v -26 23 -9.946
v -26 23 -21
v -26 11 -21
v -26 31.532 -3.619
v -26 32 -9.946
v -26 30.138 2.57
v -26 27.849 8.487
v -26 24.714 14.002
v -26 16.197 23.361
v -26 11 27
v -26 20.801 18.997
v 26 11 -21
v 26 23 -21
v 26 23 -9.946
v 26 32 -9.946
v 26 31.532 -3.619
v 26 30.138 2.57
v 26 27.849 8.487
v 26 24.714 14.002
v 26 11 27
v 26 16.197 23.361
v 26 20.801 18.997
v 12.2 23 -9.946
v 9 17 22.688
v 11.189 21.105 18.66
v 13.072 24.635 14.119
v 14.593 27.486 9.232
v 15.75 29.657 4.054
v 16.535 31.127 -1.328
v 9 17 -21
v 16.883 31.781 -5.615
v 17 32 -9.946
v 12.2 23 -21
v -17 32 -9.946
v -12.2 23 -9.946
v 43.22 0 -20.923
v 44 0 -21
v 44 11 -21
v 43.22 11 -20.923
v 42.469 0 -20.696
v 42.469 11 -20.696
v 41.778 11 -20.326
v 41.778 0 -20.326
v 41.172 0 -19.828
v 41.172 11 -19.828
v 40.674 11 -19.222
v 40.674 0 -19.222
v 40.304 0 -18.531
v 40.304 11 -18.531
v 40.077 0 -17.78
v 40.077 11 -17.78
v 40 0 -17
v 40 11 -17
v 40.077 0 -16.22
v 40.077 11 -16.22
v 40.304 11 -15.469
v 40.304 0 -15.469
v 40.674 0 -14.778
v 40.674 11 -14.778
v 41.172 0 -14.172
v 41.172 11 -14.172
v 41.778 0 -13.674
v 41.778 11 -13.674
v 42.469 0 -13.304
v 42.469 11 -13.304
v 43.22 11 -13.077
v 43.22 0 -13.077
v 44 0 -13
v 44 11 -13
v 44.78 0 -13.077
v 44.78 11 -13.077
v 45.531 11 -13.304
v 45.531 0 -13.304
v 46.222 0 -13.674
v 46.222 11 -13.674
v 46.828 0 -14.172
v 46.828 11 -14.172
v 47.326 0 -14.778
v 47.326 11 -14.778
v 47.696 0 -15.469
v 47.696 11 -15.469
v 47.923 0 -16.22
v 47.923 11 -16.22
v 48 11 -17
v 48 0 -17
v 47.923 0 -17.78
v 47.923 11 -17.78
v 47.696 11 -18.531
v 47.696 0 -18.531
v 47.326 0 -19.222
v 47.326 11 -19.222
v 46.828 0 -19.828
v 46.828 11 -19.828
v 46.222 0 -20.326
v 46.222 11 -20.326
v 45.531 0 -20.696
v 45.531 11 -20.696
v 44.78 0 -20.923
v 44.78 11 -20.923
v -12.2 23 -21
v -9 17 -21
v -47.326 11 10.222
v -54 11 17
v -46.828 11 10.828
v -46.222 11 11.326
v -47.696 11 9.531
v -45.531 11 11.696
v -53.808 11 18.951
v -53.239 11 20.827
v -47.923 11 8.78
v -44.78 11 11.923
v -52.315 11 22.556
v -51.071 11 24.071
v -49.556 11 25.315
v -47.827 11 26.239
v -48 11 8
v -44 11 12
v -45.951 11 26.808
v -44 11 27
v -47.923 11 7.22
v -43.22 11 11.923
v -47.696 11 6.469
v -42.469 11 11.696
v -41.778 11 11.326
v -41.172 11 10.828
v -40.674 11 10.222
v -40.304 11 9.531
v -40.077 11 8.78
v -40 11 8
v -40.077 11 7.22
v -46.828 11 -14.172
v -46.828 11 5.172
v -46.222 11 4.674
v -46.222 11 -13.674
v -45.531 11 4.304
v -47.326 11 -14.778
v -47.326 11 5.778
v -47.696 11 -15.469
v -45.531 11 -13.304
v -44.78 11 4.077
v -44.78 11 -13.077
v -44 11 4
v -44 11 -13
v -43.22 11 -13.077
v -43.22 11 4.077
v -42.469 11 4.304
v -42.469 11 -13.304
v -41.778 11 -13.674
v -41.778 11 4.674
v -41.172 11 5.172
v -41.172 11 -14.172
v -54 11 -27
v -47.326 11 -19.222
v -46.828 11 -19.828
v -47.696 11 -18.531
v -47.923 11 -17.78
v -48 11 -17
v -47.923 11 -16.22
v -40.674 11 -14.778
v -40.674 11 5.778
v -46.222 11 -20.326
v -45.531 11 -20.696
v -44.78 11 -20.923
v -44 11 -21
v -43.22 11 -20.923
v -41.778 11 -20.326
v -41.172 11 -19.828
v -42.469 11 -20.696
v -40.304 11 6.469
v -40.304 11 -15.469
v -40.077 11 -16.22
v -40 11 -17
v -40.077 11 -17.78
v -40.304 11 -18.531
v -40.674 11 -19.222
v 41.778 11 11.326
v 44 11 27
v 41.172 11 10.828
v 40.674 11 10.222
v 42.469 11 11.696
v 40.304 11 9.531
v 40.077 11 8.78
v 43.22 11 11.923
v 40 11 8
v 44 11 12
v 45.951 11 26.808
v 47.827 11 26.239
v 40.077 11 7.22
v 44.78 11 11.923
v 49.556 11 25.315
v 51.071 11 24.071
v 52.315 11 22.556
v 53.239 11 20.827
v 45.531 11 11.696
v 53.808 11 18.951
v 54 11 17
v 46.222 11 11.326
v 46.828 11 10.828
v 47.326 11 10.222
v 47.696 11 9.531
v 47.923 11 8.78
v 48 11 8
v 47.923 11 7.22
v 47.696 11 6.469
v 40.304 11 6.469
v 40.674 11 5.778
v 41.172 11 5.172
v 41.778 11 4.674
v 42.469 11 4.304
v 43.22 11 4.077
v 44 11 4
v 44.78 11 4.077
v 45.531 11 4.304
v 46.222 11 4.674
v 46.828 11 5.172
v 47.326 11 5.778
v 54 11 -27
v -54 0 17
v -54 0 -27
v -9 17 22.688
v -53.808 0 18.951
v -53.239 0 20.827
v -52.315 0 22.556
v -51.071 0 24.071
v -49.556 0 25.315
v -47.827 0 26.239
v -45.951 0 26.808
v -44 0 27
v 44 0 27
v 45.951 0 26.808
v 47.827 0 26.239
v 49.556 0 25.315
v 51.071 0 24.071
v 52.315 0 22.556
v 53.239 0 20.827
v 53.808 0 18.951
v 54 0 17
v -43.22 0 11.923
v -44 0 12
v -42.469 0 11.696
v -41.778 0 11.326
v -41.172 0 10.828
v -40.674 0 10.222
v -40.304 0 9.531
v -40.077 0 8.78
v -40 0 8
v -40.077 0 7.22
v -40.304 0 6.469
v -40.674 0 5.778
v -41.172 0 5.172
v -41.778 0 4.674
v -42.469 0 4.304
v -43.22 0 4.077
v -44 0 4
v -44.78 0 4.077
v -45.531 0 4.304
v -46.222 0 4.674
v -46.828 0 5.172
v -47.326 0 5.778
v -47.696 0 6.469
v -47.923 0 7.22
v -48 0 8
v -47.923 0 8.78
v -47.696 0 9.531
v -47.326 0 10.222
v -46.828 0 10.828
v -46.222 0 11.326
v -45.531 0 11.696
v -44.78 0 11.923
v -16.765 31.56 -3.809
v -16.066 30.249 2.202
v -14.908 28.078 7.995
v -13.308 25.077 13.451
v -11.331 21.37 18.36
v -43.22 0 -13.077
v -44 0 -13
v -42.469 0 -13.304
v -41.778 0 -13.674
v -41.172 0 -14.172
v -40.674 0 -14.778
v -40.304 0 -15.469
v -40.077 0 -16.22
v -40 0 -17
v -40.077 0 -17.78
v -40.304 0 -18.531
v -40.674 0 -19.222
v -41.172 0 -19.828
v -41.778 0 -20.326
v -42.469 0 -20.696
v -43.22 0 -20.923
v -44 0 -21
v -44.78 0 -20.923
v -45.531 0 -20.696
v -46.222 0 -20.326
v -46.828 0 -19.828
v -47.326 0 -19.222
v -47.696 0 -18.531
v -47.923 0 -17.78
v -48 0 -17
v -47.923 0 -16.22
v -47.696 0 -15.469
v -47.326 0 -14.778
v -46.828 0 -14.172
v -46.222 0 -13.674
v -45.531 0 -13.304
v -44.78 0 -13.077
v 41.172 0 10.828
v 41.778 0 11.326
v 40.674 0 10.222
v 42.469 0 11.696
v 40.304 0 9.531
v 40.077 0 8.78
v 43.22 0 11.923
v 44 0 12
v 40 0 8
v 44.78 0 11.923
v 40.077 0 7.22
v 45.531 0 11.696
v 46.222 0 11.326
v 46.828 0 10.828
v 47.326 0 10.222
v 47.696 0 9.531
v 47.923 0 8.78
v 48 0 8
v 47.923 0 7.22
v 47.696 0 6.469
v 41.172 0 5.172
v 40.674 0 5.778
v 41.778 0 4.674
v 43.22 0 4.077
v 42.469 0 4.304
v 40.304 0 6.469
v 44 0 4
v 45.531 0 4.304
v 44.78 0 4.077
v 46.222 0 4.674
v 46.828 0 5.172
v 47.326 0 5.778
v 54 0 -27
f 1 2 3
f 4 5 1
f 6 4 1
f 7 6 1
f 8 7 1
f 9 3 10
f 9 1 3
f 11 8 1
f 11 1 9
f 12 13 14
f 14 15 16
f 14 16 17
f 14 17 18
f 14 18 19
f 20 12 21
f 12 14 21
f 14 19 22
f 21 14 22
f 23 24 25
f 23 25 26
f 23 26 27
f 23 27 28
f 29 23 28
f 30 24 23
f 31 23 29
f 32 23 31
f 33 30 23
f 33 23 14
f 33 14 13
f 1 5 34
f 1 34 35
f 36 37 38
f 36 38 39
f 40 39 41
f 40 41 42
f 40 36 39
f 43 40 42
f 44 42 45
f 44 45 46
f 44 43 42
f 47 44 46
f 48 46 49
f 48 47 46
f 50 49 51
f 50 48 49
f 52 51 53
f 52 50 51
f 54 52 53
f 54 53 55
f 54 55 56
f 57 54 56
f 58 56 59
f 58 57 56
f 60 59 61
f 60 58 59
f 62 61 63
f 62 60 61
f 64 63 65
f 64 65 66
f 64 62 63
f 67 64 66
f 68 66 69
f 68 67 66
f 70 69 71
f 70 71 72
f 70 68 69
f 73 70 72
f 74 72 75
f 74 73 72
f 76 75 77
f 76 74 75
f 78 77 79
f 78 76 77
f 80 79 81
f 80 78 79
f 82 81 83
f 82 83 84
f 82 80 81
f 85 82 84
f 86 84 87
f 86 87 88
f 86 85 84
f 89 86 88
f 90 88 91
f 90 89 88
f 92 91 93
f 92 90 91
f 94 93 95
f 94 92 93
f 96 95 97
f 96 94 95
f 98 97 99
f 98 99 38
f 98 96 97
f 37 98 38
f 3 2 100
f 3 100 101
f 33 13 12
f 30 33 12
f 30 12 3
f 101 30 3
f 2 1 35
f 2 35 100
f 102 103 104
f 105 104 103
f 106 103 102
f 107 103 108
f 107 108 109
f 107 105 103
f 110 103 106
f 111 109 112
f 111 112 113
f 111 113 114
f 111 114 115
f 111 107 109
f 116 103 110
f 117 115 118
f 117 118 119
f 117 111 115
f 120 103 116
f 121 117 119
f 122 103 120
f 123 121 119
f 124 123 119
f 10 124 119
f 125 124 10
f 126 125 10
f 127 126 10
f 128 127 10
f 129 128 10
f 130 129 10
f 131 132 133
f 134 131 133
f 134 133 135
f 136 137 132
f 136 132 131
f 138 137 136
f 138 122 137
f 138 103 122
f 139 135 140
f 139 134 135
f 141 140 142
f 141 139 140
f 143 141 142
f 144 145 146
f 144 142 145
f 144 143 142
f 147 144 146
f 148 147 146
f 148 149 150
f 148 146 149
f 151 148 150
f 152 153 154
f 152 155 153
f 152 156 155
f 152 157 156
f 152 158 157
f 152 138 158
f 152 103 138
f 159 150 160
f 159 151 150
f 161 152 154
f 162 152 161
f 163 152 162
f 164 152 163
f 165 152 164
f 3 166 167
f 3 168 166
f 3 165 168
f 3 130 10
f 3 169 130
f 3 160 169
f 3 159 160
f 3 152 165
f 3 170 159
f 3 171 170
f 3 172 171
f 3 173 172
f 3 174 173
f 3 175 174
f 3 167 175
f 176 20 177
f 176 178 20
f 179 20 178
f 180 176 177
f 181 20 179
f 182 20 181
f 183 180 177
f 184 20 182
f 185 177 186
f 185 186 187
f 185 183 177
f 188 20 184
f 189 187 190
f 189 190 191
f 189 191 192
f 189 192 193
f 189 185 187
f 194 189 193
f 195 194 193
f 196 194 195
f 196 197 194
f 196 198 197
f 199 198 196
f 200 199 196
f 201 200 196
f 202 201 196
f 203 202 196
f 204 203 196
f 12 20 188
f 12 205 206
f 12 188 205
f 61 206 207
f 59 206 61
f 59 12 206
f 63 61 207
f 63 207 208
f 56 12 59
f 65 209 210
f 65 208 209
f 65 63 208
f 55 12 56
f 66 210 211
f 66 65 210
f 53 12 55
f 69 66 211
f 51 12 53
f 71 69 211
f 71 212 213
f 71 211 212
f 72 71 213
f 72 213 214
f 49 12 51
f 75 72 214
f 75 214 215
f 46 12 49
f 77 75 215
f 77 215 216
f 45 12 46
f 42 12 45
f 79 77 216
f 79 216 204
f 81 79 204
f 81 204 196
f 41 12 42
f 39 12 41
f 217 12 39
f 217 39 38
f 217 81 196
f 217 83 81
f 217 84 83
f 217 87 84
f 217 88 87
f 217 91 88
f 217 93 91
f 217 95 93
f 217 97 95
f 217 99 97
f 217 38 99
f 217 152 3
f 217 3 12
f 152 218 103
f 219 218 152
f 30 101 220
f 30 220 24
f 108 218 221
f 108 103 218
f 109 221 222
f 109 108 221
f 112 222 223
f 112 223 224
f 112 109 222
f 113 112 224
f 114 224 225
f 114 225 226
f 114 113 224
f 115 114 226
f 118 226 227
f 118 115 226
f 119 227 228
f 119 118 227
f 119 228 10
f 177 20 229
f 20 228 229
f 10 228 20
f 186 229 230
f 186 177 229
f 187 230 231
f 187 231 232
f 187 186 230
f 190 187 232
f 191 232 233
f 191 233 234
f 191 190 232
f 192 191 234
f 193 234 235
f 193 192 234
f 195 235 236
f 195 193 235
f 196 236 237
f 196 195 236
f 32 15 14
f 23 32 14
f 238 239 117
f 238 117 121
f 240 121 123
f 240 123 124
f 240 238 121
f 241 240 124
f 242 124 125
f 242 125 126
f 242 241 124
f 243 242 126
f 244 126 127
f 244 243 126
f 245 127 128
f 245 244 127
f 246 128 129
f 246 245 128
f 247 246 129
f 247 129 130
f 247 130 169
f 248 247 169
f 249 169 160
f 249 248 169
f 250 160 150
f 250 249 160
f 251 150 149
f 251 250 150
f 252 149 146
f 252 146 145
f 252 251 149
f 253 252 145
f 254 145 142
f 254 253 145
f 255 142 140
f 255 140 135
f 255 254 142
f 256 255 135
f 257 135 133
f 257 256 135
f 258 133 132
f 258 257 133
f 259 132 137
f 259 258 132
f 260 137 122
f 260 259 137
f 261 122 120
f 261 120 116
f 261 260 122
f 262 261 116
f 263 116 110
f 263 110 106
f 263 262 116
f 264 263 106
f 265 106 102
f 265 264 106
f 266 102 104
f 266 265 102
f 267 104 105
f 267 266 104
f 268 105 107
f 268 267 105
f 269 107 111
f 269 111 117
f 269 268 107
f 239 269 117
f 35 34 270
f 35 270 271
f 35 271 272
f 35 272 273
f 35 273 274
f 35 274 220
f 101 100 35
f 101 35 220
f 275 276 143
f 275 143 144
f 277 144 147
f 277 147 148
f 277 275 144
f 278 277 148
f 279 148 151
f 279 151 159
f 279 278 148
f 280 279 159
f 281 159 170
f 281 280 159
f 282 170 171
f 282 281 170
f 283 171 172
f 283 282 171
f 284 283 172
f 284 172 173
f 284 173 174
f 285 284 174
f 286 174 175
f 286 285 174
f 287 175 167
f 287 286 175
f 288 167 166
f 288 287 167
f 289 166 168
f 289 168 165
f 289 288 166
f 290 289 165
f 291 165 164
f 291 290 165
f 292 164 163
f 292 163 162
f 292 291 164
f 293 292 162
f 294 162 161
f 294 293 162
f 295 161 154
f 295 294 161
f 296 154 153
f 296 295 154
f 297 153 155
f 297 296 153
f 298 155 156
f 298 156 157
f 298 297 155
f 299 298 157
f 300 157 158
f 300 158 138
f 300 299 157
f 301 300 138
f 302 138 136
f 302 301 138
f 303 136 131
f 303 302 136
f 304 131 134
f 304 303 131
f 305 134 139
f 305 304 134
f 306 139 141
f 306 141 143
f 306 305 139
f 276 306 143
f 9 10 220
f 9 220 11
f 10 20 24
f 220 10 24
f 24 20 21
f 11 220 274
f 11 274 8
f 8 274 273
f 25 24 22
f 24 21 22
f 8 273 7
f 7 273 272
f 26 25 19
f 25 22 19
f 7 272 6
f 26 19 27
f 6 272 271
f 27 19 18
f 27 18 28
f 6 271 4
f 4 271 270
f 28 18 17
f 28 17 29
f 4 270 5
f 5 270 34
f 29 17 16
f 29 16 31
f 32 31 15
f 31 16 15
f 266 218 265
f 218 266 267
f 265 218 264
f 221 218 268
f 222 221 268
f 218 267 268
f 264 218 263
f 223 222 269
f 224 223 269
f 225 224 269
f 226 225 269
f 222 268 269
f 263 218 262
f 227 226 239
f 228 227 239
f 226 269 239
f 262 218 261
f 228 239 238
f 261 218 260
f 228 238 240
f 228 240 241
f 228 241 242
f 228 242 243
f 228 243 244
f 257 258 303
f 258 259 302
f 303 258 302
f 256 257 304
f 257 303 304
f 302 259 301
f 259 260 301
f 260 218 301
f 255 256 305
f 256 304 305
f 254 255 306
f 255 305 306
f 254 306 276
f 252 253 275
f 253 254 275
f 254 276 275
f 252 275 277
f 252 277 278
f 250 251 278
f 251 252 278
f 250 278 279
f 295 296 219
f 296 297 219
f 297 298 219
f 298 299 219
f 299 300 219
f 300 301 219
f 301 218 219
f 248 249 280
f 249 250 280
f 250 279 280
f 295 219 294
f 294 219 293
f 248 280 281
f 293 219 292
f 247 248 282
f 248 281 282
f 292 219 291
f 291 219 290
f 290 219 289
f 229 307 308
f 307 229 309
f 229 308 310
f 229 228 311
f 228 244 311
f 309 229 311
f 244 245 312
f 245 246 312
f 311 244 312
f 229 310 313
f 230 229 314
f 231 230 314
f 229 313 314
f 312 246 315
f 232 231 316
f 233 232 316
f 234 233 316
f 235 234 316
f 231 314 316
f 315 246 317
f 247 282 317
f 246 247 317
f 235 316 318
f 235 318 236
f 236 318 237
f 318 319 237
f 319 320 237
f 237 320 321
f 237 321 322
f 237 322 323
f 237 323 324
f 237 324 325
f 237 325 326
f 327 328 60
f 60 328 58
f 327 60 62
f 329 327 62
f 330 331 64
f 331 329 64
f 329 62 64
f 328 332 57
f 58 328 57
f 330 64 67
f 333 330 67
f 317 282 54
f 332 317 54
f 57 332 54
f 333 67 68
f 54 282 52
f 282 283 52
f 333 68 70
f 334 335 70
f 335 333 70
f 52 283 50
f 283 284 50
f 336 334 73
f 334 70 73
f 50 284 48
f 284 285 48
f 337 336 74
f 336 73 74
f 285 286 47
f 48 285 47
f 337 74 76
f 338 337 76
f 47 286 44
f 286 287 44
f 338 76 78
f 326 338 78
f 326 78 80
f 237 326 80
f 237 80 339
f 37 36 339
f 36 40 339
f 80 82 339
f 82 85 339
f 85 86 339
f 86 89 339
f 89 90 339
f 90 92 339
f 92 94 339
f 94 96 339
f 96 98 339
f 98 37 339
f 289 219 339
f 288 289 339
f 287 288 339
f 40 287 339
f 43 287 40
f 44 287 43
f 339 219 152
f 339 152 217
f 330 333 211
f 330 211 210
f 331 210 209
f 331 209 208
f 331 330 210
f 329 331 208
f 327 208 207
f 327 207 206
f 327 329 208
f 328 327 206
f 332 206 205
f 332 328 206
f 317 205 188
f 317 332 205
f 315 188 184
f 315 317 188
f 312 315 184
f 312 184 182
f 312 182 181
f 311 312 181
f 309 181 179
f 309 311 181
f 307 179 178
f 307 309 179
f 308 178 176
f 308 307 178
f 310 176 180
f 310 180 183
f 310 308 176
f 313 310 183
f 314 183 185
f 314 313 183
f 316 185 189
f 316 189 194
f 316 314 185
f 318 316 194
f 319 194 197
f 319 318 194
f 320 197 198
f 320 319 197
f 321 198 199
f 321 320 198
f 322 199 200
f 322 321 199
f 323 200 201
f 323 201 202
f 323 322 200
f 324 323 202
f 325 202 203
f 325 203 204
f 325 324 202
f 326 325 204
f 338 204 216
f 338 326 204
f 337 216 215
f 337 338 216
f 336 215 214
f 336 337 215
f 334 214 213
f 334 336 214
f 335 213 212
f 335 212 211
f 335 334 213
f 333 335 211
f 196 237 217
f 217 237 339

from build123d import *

# Parameters (mm, degrees)
SKETCH1_W                      = 108
SKETCH1_H                      = 54
SKETCH1_R                      = 4
BOSS_EXTRUDE3_DEPTH            = 11
BOSS_EXTRUDE4_DEPTH            = 26
CUT_EXTRUDE1_REACH             = 70.33
CUT_EXTRUDE1_DIRECTION_2_REACH = 70.33
FILLET1_R                      = 10


with BuildPart() as part:
    # Sketch1 → Boss-Extrude3 (new body)
    with BuildSketch(Plane(origin=(0, 0, 0), x_dir=(1, 0, 0), z_dir=(0, 1, 0))):
        Rectangle(SKETCH1_W, SKETCH1_H)
        with Locations((-44, -8)):
            Circle(SKETCH1_R, mode=Mode.SUBTRACT)
        with Locations((-44, 17)):
            Circle(SKETCH1_R, mode=Mode.SUBTRACT)
        with Locations((44, 17)):
            Circle(SKETCH1_R, mode=Mode.SUBTRACT)
        with Locations((44, -8)):
            Circle(SKETCH1_R, mode=Mode.SUBTRACT)
    extrude(amount=BOSS_EXTRUDE3_DEPTH)

    # Sketch4 → Boss-Extrude4 (add, symmetric)
    with BuildSketch(Plane(origin=(0, 0, 0), x_dir=(0, 0, -1), z_dir=(1, 0, 0))):
        with BuildLine():
            Line((9.945906404, 32), (9.945906404, 23))
            Line((9.945906404, 23), (21, 23))
            Line((21, 23), (21, 11))
            Line((21, 11), (-27, 11))
            ThreePointArc((-27, 11), (-11.302622957, 26.383151285), (9.945906404, 32))
        make_face()
    extrude(amount=BOSS_EXTRUDE4_DEPTH, both=True)

    # Sketch5 → Cut-Extrude1 (cut, up to next)
    with BuildSketch(Plane.XY, mode=Mode.PRIVATE) as cut_extrude1_sk1:
        Polygon((-17, 32), (-9, 17), (9, 17), (17, 32), align=None)
    cut_extrude1_tool1 = extrude(cut_extrude1_sk1.sketch, amount=-CUT_EXTRUDE1_REACH, mode=Mode.PRIVATE) & part.part
    add(cut_extrude1_tool1.solids().sort_by_distance((0, 25.269231, 0))[0], mode=Mode.SUBTRACT)

    # Sketch5 → Cut-Extrude1 direction 2 (cut, up to next)
    with BuildSketch(Plane.XY, mode=Mode.PRIVATE) as cut_extrude1_direction_2_sk1:
        Polygon((-17, 32), (-9, 17), (9, 17), (17, 32), align=None)
    cut_extrude1_direction_2_tool1 = extrude(cut_extrude1_direction_2_sk1.sketch, amount=CUT_EXTRUDE1_DIRECTION_2_REACH, mode=Mode.PRIVATE) & part.part
    add(cut_extrude1_direction_2_tool1.solids().sort_by_distance((0, 25.269231, 0))[0], mode=Mode.SUBTRACT)

    # Fillet1
    fillet1_edges = [part.edges().sort_by_distance(p)[0] for p in [
        (-54, 5.5, 27),
        (54, 5.5, 27),
    ]]
    fillet(fillet1_edges, radius=FILLET1_R)


solid = part.part
